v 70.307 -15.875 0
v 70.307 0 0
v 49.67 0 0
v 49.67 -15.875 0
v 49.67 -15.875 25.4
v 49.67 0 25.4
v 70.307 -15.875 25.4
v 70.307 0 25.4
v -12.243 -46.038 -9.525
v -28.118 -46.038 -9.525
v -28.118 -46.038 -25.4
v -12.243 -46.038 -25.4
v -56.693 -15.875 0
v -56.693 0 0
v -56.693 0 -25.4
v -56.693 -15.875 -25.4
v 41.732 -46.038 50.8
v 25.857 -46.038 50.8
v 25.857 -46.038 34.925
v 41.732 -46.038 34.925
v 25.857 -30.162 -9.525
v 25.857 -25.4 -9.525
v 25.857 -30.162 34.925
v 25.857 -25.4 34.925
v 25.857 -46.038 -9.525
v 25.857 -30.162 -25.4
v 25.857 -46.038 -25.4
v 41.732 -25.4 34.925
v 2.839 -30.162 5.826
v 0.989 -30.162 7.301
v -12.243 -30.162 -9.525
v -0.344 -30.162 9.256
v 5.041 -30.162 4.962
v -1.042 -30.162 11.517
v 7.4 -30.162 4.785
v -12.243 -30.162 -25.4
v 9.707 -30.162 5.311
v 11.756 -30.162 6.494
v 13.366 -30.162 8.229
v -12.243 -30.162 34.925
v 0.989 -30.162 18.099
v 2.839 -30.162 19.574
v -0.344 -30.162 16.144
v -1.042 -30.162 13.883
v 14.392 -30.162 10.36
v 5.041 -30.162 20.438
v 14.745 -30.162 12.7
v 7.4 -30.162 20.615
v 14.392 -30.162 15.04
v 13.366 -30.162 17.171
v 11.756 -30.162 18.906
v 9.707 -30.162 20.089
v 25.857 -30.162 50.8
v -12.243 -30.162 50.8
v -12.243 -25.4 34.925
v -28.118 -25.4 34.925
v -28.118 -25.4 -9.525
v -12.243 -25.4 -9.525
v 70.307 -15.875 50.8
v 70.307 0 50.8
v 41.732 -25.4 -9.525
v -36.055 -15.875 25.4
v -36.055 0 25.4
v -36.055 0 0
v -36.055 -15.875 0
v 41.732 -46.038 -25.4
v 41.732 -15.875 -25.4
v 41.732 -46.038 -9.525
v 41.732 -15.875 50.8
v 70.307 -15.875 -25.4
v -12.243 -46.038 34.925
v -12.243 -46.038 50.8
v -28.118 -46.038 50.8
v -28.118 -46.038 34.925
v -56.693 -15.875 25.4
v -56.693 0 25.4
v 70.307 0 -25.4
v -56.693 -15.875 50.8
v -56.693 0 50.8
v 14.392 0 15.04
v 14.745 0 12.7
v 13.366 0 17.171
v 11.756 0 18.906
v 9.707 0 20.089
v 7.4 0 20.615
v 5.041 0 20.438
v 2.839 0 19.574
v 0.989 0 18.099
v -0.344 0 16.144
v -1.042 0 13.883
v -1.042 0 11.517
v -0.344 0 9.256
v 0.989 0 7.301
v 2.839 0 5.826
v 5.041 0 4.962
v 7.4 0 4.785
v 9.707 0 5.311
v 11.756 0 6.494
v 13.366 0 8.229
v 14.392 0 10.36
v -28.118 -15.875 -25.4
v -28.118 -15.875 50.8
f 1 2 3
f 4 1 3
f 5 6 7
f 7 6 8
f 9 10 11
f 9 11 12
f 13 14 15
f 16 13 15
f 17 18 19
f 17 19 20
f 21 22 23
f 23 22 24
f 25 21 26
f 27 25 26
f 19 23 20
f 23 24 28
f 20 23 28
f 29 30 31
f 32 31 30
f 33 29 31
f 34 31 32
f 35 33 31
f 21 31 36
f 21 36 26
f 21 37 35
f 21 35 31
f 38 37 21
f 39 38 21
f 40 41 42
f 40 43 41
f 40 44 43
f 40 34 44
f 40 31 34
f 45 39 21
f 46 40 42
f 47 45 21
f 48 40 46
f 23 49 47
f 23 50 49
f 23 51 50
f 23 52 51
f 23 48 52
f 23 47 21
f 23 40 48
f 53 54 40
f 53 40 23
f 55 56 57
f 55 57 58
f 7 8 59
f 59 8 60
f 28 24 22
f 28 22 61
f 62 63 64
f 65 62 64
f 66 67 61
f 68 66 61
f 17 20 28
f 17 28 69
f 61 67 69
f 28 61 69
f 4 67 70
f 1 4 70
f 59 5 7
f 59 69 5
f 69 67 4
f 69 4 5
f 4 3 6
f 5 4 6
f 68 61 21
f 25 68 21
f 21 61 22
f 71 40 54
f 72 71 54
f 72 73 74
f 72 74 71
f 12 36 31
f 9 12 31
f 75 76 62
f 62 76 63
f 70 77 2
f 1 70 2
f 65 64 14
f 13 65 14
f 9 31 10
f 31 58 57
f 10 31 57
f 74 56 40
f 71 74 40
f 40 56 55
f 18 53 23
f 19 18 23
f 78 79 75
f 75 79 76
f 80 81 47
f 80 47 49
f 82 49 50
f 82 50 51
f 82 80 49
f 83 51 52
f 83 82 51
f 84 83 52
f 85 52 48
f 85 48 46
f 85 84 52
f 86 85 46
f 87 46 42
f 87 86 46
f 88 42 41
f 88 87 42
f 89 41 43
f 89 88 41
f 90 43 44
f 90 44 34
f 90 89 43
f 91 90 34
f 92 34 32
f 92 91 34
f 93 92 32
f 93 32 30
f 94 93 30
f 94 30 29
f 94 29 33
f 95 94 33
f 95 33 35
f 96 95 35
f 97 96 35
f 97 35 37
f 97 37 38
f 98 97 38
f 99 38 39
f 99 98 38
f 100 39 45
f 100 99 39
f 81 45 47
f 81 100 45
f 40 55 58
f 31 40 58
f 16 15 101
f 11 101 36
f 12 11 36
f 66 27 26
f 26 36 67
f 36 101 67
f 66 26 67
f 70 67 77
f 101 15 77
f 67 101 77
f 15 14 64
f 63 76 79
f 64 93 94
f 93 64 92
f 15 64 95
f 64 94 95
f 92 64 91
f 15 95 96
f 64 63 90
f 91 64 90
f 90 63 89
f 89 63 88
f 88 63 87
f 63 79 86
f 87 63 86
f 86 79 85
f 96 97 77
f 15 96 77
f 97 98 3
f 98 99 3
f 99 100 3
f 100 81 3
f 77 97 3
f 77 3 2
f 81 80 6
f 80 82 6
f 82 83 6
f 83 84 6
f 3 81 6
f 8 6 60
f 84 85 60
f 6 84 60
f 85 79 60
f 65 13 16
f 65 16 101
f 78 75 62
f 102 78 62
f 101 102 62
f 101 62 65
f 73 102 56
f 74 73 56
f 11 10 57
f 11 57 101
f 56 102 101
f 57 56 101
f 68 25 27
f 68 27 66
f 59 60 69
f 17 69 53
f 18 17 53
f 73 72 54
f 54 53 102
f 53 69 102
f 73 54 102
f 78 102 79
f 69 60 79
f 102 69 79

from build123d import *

# Parameters (mm, degrees)
F1_DEPTH = 15.875
F2_DEPTH = 46.0375
F0_R     = 7.9375
F3_DEPTH = 30.1625
F4_DEPTH = 25.4


with BuildPart() as f1:
    # F0 (on Front) → F1 (new body)
    with BuildSketch(Plane.XZ):
        Polygon((-28.1177360594, 50.8), (-56.6927360594, 50.8), (-56.6927360594, 25.4), (-36.0552360594, 25.4), (-36.0552360594, 0), (-56.6927360594, 0), (-56.6927360594, -25.4), (-28.1177360594, -25.4), (-28.1177360594, -9.525), (-28.1177360594, 34.925), align=None)
    extrude(amount=F1_DEPTH)

    # F0 (on Front) → F2 (join)
    with BuildSketch(Plane.XZ):
        Polygon((-12.2427360594, 50.8), (-28.1177360594, 50.8), (-28.1177360594, 34.925), (-20.1802360594, 34.925), (-12.2427360594, 34.925), align=None)
        Polygon((-20.1802360594, -9.525), (-28.1177360594, -9.525), (-28.1177360594, -25.4), (-12.2427360594, -25.4), (-12.2427360594, -9.525), align=None)
    extrude(amount=F2_DEPTH)



with BuildPart() as f1b:
    # F0 (on Front) → F1, piece 2 (new body)
    with BuildSketch(Plane.XZ):
        Polygon((70.3072639406, 50.8), (41.7322639406, 50.8), (41.7322639406, 34.925), (41.7322639406, -9.525), (41.7322639406, -25.4), (70.3072639406, -25.4), (70.3072639406, 0), (49.6697639406, 0), (49.6697639406, 25.4), (70.3072639406, 25.4), align=None)
    extrude(amount=F1_DEPTH)

    # F0 (on Front) → F2, piece 2 (join)
    with BuildSketch(Plane.XZ):
        Polygon((41.7322639406, 50.8), (25.8572639406, 50.8), (25.8572639406, 34.925), (33.7947639406, 34.925), (41.7322639406, 34.925), align=None)
        Polygon((33.7947639406, -9.525), (25.8572639406, -9.525), (25.8572639406, -25.4), (41.7322639406, -25.4), (41.7322639406, -9.525), align=None)
    extrude(amount=F2_DEPTH)


with BuildPart() as f1_1:
    add(f1.part)

    add(f1b.part)  # F3 merges F1b
    # F0 (on Front) → F3 (join)
    with BuildSketch(Plane.XZ):
        Polygon((25.8572639406, 50.8), (-12.2427360594, 50.8), (-12.2427360594, 34.925), (-12.2427360594, -9.525), (-12.2427360594, -25.4), (25.8572639406, -25.4), (25.8572639406, -9.525), (25.8572639406, 34.925), align=None)
        with Locations((6.8072639406, 12.7)):
            Circle(F0_R, mode=Mode.SUBTRACT)
    extrude(amount=F3_DEPTH)

    # F0 (on Front) → F4 (join)
    with BuildSketch(Plane.XZ):
        Polygon((-20.1802360594, 34.925), (-28.1177360594, 34.925), (-28.1177360594, -9.525), (-20.1802360594, -9.525), (-12.2427360594, -9.525), (-12.2427360594, 34.925), align=None)
        Polygon((33.7947639406, 34.925), (25.8572639406, 34.925), (25.8572639406, -9.525), (33.7947639406, -9.525), (41.7322639406, -9.525), (41.7322639406, 34.925), align=None)
    extrude(amount=F4_DEPTH)


solid = f1_1.part
